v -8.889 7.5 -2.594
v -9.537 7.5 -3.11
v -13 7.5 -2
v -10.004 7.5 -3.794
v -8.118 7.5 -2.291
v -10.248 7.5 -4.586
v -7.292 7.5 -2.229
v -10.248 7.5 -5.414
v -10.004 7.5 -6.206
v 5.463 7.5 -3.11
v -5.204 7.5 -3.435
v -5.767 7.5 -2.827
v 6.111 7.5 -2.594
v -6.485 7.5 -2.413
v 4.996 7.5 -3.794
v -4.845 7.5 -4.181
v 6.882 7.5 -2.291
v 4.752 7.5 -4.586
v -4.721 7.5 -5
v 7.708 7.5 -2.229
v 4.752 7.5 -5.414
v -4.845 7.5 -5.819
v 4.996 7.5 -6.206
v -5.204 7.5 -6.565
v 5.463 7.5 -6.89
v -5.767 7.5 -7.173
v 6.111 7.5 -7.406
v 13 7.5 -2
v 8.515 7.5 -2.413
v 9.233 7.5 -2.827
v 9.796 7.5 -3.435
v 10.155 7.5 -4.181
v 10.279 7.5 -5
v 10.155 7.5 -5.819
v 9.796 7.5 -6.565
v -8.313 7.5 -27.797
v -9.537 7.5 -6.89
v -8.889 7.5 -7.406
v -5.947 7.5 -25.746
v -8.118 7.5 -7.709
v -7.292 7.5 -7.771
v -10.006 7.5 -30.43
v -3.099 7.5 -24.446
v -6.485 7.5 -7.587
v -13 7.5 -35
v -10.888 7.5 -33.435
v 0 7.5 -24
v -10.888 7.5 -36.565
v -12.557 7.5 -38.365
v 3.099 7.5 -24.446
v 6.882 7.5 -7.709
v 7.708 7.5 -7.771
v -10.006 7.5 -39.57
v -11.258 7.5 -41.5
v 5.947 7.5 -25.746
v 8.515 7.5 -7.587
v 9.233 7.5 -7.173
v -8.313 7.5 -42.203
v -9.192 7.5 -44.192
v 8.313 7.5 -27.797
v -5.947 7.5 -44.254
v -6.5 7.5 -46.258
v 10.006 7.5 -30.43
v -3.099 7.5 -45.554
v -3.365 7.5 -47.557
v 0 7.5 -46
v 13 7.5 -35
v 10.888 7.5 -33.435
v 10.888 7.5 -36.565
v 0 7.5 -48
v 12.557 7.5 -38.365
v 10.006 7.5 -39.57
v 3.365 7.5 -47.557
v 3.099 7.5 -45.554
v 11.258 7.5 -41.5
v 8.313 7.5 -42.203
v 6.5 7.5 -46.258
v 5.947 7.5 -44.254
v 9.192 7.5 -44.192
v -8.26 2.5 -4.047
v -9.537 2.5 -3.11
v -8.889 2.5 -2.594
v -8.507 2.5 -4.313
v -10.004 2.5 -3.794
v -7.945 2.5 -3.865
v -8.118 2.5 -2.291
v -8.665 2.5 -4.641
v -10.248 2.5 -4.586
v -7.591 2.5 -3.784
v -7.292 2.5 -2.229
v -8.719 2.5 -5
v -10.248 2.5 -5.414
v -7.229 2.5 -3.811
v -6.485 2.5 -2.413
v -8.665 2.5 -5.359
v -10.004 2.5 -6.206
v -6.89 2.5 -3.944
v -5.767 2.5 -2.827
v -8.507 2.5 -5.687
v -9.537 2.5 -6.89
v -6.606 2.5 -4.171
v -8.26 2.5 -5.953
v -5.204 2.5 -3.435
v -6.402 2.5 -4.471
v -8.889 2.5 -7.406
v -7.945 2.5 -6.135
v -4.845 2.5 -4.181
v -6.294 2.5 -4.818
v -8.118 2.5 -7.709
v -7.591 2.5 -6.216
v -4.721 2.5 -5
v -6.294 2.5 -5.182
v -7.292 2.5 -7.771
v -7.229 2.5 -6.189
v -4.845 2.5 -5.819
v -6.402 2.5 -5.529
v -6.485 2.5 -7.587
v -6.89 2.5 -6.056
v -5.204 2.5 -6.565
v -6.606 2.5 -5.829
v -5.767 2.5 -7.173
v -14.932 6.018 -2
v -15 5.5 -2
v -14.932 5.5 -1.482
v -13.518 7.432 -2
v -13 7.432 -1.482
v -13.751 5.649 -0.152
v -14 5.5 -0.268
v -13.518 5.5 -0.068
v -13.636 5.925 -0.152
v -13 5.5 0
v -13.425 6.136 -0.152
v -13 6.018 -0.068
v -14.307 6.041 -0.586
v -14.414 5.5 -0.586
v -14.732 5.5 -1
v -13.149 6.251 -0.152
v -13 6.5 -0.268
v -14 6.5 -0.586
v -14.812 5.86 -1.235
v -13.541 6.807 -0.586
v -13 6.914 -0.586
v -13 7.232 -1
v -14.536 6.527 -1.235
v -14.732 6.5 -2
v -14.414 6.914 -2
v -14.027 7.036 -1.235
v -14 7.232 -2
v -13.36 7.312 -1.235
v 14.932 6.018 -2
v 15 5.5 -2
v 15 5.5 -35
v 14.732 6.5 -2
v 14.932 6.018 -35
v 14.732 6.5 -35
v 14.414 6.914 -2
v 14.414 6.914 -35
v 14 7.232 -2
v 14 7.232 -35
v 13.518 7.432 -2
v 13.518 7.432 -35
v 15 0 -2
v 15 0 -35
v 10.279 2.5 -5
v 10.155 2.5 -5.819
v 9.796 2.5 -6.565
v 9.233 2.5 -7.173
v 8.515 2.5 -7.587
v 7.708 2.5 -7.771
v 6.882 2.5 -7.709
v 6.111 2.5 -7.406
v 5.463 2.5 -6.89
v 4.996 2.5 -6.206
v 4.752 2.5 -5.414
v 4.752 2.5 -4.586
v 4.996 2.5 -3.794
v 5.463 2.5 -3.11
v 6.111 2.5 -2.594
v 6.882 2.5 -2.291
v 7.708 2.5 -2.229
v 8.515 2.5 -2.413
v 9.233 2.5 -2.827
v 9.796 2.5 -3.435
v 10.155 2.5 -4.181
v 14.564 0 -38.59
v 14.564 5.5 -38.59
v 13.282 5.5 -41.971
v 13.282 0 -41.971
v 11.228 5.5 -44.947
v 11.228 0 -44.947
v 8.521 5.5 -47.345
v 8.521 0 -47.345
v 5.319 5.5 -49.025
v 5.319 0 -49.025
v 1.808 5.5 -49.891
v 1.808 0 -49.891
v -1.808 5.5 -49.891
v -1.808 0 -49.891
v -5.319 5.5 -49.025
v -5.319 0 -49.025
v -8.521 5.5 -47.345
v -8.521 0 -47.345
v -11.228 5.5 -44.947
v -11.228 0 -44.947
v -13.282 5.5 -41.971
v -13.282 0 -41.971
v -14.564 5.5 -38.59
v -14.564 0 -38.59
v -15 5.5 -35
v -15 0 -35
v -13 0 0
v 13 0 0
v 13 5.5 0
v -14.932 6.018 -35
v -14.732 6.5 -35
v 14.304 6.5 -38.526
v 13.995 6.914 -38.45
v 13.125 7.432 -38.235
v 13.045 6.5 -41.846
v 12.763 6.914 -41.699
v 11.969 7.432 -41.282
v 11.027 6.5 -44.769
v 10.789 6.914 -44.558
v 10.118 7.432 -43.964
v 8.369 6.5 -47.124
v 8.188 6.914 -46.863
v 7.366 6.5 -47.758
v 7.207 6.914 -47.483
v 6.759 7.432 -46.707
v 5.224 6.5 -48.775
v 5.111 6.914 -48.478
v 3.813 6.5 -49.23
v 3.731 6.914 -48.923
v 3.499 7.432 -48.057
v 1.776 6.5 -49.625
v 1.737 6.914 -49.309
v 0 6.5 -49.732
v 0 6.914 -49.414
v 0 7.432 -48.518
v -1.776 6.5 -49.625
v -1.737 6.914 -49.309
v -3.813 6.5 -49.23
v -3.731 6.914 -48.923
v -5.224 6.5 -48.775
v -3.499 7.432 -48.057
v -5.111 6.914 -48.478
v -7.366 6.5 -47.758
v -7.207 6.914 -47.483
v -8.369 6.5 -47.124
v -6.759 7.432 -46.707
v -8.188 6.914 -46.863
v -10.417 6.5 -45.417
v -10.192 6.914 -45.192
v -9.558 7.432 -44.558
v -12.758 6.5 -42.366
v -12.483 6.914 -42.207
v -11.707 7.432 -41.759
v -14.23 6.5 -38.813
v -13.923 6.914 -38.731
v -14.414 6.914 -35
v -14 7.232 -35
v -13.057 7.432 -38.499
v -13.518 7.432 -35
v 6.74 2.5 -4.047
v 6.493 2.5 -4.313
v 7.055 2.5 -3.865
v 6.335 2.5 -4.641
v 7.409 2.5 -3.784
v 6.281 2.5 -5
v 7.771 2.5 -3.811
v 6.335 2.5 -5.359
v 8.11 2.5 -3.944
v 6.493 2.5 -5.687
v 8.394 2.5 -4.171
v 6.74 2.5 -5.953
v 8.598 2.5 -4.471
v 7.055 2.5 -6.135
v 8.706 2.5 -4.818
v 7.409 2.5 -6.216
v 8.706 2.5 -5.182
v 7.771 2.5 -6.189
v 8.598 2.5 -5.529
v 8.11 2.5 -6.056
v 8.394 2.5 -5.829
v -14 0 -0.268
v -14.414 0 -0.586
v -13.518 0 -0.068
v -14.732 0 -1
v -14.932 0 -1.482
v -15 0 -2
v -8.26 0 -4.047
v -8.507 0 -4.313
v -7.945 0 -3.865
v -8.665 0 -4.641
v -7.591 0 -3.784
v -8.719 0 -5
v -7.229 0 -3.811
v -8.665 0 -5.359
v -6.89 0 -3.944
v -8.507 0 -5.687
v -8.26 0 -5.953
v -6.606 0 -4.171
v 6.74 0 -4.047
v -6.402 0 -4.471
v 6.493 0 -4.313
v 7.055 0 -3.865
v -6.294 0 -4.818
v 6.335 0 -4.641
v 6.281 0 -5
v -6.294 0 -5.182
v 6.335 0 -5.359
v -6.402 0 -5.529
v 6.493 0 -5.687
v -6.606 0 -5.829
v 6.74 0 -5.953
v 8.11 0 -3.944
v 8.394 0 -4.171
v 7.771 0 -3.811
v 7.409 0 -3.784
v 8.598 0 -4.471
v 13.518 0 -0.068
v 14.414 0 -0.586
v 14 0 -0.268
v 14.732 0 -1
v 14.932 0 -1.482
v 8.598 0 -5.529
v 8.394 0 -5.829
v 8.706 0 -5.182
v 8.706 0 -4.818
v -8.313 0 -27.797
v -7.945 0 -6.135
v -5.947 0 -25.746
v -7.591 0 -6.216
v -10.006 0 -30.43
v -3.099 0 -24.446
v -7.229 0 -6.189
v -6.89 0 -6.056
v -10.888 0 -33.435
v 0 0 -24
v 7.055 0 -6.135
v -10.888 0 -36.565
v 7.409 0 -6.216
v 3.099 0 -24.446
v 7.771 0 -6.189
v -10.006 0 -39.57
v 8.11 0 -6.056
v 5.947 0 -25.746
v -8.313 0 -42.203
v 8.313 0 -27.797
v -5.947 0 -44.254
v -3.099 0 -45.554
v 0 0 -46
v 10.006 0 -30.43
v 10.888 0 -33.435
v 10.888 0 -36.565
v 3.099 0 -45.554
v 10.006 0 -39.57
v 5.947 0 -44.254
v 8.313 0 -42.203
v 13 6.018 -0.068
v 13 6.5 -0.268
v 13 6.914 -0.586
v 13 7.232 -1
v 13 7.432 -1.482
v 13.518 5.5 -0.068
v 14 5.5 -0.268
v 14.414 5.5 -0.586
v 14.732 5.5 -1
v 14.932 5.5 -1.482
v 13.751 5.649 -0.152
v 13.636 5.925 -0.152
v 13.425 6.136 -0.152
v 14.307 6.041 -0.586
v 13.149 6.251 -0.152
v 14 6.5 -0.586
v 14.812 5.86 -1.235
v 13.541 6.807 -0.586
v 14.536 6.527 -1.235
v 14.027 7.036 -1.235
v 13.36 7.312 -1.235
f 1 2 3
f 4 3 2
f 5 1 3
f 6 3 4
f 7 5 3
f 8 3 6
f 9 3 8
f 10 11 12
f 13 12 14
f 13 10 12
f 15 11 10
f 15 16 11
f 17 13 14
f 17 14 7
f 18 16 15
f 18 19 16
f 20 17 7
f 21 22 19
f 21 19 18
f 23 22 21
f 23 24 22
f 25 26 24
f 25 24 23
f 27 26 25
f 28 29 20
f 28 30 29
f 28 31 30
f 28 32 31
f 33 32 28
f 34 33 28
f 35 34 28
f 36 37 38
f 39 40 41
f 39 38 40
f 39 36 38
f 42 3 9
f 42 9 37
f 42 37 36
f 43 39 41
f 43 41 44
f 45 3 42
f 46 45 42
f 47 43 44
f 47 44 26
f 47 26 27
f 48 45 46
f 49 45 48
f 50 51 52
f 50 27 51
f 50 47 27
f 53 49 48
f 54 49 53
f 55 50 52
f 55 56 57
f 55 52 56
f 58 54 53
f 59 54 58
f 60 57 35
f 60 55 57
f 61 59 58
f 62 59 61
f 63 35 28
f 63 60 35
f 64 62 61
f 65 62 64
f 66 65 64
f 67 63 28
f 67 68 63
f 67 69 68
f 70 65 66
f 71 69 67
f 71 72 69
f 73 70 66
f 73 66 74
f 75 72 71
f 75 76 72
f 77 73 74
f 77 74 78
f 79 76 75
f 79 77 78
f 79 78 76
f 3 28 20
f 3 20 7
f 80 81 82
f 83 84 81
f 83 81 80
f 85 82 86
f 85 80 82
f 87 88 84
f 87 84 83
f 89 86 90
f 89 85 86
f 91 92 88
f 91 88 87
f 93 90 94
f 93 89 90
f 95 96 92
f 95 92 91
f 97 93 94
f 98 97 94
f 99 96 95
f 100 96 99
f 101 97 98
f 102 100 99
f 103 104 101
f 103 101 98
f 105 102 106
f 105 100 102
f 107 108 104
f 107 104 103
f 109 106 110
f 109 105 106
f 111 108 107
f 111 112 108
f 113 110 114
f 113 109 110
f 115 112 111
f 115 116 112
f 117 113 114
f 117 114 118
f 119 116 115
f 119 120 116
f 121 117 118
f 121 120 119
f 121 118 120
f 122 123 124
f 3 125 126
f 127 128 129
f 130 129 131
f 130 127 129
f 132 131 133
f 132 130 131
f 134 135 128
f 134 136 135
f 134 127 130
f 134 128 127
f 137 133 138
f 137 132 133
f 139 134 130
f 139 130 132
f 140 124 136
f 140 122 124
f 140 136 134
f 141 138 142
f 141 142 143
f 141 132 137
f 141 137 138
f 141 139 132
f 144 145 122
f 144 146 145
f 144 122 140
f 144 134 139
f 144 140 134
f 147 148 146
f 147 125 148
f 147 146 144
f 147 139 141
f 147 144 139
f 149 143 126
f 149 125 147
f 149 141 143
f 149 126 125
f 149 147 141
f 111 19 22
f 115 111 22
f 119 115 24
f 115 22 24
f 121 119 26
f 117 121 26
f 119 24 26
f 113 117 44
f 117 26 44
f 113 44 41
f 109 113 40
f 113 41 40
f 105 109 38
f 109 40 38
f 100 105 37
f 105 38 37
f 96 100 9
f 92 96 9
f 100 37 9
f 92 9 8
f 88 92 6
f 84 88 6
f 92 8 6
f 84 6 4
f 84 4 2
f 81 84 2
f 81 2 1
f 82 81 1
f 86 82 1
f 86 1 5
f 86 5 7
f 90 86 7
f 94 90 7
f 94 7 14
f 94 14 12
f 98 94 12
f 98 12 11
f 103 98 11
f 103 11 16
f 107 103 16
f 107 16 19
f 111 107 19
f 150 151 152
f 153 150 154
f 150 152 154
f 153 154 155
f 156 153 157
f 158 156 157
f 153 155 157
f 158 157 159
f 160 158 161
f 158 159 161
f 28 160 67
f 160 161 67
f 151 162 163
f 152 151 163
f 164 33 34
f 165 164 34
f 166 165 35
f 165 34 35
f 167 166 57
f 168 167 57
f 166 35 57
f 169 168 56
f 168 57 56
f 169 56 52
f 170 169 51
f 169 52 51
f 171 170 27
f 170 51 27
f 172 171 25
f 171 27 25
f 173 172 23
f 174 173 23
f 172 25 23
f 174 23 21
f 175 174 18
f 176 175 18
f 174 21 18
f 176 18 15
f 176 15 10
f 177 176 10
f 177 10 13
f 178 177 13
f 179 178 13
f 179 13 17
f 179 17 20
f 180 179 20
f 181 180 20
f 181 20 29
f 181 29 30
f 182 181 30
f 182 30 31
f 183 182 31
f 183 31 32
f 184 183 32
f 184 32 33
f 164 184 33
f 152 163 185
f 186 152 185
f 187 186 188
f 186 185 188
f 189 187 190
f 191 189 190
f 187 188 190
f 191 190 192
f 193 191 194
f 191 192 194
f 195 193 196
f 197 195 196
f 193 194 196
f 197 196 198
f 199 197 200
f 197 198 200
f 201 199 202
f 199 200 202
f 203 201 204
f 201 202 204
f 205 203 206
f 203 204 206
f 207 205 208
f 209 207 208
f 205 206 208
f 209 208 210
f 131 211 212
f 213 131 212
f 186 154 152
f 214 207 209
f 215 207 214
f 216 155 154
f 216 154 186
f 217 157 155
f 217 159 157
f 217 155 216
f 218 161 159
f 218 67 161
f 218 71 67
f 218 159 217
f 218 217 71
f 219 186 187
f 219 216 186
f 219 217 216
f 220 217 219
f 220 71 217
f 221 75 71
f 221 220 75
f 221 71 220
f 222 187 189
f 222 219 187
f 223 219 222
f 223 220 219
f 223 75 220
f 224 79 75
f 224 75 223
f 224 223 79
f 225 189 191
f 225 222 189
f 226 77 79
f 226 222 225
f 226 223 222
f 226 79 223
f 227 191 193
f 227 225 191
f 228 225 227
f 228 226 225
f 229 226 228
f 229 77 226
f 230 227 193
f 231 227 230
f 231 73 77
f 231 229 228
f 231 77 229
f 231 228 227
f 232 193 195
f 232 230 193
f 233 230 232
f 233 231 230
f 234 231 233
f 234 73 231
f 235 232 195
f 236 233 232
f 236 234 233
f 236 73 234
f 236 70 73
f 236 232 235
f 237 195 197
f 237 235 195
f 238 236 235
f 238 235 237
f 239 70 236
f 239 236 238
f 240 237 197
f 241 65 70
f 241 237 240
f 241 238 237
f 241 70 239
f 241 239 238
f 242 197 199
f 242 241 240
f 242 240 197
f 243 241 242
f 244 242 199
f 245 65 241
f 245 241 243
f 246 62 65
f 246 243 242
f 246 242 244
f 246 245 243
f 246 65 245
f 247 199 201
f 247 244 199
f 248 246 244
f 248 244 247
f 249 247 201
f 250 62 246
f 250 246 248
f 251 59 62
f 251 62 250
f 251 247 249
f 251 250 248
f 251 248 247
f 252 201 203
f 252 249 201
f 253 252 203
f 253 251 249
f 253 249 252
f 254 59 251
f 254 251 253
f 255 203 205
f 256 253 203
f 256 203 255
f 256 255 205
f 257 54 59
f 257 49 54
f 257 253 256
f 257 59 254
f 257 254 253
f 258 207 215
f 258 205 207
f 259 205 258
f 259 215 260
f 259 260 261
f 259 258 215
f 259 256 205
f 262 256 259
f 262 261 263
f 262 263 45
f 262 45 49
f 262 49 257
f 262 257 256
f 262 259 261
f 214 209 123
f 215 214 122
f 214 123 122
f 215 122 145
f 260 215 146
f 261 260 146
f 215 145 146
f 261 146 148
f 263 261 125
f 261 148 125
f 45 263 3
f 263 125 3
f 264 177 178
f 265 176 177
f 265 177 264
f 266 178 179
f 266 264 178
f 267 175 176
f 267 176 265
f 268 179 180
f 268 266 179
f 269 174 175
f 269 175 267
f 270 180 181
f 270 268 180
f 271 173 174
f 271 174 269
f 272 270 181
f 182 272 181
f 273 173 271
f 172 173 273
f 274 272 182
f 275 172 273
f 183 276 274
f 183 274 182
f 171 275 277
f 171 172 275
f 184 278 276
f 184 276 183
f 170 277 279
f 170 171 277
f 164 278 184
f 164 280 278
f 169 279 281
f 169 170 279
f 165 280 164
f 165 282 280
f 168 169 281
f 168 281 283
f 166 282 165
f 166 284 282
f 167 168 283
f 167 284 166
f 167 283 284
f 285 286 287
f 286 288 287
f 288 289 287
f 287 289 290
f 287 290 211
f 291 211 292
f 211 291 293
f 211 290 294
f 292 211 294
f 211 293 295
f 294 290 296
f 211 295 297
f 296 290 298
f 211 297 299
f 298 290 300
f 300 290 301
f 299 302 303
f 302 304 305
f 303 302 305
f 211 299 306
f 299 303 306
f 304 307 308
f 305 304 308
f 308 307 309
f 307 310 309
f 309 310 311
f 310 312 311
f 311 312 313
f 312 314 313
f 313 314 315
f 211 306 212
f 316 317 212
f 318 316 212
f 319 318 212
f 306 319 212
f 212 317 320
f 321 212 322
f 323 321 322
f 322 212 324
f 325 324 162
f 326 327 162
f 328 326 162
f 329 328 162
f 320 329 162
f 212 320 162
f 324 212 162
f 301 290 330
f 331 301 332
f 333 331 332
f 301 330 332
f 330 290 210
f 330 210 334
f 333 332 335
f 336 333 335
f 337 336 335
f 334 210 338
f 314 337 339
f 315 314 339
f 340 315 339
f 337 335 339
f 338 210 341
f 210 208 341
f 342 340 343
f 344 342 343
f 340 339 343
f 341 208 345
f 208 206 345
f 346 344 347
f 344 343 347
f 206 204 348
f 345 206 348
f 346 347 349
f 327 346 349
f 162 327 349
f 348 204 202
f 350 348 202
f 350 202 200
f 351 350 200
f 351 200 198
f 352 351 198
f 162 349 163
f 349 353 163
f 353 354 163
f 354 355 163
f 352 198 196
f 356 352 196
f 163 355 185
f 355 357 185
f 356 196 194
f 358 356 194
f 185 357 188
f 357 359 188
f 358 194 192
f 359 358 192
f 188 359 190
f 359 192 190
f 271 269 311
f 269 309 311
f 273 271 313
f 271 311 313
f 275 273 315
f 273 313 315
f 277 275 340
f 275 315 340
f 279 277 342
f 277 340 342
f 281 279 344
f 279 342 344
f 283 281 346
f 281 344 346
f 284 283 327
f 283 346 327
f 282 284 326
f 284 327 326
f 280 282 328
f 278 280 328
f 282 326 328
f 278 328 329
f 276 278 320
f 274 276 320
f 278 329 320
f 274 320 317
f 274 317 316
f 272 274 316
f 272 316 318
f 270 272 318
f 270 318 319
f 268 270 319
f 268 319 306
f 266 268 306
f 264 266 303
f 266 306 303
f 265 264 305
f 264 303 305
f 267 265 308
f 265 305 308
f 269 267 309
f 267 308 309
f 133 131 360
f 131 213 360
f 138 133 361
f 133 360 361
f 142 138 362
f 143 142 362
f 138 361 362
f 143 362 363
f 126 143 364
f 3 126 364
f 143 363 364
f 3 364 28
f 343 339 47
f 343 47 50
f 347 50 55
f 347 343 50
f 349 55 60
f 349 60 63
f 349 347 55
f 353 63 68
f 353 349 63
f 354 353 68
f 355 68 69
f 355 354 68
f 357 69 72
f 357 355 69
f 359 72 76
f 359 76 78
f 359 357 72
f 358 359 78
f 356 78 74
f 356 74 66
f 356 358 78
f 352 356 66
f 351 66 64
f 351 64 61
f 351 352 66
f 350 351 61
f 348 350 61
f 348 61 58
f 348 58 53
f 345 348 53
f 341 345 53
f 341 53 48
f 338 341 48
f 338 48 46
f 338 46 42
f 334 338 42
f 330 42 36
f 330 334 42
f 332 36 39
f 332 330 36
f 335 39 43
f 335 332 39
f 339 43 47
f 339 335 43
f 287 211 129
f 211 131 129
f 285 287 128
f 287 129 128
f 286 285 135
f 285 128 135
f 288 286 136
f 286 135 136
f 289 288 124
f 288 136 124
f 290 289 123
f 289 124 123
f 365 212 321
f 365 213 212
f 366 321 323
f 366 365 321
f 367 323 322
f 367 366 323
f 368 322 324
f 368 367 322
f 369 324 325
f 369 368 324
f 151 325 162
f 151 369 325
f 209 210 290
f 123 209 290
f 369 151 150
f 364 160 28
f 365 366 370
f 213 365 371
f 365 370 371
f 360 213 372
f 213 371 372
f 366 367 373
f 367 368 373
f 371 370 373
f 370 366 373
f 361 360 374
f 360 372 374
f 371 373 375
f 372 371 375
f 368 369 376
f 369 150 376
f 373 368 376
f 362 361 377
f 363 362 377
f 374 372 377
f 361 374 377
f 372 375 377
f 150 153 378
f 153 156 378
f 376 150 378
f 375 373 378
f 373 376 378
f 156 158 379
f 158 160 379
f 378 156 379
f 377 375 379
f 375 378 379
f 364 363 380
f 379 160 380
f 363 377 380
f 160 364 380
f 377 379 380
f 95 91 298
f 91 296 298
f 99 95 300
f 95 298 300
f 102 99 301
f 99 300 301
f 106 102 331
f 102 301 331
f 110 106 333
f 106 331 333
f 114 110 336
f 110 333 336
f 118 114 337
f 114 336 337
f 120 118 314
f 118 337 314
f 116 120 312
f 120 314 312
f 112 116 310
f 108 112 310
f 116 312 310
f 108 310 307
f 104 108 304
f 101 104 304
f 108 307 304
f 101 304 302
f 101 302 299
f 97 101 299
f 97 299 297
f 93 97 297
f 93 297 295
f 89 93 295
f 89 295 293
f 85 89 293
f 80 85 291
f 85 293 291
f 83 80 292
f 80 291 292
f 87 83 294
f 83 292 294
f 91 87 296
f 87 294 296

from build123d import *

# Parameters (mm, degrees)
SKETCH1_R                                           = 11
BOSS_EXTRUDE1_DEPTH                                 = 7.5
CBORE_FOR_2_BINDING_HEAD_MACHINE_SCREW1_D           = 2.4384
CBORE_FOR_2_BINDING_HEAD_MACHINE_SCREW1_DEPTH       = 10
CBORE_FOR_2_BINDING_HEAD_MACHINE_SCREW1_CBORE_D     = 5.55752
CBORE_FOR_2_BINDING_HEAD_MACHINE_SCREW1_CBORE_DEPTH = 4.999999906
CBORE_FOR_2_BINDING_HEAD_MACHINE_SCREW1_TIP         = 0.732569267
FILLET1_R                                           = 2


with BuildPart() as part:
    # Sketch1 → Boss-Extrude1 (new body)
    with BuildSketch(Plane(origin=(0, 0, 0), x_dir=(1, 0, 0), z_dir=(0, 1, 0))):
        with BuildLine():
            Line((-15, 0), (15, 0))
            Line((15, 0), (15, 35))
            ThreePointArc((15, 35), (0, 50), (-15, 35))
            Line((-15, 35), (-15, 0))
        make_face()
        with Locations(Location((0, 35, 0), (0, 0, 270))):
            Circle(SKETCH1_R, mode=Mode.SUBTRACT)
    extrude(amount=BOSS_EXTRUDE1_DEPTH)

    # CBORE for #2 Binding Head Machine Screw1
    with Locations(Plane(origin=(0, 7.5, 0), x_dir=(1, 0, 0), z_dir=(0, 1, 0))):
        with Locations((-7.5, 5), (7.5, 5)):
            CounterBoreHole(CBORE_FOR_2_BINDING_HEAD_MACHINE_SCREW1_D / 2, CBORE_FOR_2_BINDING_HEAD_MACHINE_SCREW1_CBORE_D / 2, CBORE_FOR_2_BINDING_HEAD_MACHINE_SCREW1_CBORE_DEPTH, depth=CBORE_FOR_2_BINDING_HEAD_MACHINE_SCREW1_DEPTH)
            with Locations((0, 0, -(CBORE_FOR_2_BINDING_HEAD_MACHINE_SCREW1_DEPTH + CBORE_FOR_2_BINDING_HEAD_MACHINE_SCREW1_TIP / 2))):  # 118° drill point
                Cone(0, CBORE_FOR_2_BINDING_HEAD_MACHINE_SCREW1_D / 2, CBORE_FOR_2_BINDING_HEAD_MACHINE_SCREW1_TIP, mode=Mode.SUBTRACT)

    # Fillet1
    fillet1_edges = [part.edges().sort_by_distance(p)[0] for p in [
        (15, 7.5, -17.5),
        (0, 7.5, -50),
        (-15, 7.5, -17.5),
        (15, 3.75, 0),
        (-15, 3.75, 0),
        (0, 7.5, 0),
    ]]
    fillet(fillet1_edges, radius=FILLET1_R)


solid = part.part
